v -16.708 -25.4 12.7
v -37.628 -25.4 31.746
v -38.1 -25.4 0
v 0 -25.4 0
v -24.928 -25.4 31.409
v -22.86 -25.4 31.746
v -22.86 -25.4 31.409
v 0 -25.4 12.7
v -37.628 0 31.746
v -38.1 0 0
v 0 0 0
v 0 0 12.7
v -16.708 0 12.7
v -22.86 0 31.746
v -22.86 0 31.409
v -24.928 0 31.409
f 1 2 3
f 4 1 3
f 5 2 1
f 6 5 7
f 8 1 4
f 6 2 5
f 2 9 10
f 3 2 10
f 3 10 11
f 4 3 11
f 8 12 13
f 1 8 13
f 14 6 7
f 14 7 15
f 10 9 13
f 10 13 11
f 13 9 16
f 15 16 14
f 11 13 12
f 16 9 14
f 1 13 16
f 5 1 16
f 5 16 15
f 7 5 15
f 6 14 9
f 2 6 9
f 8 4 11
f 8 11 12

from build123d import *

# Parameters (mm, degrees)
F2_DEPTH = 25.4
F3_W     = 22.86
F3_H     = 25.4
F4_DEPTH = 2.54


with BuildPart() as f2:
    # F1 (on face) → F2 (new body)
    with BuildSketch(Plane.XZ):
        Polygon((-16.708008, 12.7), (-24.927931, 31.408676), (0, 31.408676), (0, 31.74649), (-37.627931, 31.74649), (-38.1, 0), (0, 0), (0, 12.7), align=None)
    extrude(amount=F2_DEPTH)

    # F3 (on face) → F4 (cut)
    with BuildSketch(Plane.XY.offset(31.74649)):
        with Locations((-11.43, -12.7)):
            Rectangle(F3_W, F3_H)
    extrude(amount=-F4_DEPTH, mode=Mode.SUBTRACT)


solid = f2.part
